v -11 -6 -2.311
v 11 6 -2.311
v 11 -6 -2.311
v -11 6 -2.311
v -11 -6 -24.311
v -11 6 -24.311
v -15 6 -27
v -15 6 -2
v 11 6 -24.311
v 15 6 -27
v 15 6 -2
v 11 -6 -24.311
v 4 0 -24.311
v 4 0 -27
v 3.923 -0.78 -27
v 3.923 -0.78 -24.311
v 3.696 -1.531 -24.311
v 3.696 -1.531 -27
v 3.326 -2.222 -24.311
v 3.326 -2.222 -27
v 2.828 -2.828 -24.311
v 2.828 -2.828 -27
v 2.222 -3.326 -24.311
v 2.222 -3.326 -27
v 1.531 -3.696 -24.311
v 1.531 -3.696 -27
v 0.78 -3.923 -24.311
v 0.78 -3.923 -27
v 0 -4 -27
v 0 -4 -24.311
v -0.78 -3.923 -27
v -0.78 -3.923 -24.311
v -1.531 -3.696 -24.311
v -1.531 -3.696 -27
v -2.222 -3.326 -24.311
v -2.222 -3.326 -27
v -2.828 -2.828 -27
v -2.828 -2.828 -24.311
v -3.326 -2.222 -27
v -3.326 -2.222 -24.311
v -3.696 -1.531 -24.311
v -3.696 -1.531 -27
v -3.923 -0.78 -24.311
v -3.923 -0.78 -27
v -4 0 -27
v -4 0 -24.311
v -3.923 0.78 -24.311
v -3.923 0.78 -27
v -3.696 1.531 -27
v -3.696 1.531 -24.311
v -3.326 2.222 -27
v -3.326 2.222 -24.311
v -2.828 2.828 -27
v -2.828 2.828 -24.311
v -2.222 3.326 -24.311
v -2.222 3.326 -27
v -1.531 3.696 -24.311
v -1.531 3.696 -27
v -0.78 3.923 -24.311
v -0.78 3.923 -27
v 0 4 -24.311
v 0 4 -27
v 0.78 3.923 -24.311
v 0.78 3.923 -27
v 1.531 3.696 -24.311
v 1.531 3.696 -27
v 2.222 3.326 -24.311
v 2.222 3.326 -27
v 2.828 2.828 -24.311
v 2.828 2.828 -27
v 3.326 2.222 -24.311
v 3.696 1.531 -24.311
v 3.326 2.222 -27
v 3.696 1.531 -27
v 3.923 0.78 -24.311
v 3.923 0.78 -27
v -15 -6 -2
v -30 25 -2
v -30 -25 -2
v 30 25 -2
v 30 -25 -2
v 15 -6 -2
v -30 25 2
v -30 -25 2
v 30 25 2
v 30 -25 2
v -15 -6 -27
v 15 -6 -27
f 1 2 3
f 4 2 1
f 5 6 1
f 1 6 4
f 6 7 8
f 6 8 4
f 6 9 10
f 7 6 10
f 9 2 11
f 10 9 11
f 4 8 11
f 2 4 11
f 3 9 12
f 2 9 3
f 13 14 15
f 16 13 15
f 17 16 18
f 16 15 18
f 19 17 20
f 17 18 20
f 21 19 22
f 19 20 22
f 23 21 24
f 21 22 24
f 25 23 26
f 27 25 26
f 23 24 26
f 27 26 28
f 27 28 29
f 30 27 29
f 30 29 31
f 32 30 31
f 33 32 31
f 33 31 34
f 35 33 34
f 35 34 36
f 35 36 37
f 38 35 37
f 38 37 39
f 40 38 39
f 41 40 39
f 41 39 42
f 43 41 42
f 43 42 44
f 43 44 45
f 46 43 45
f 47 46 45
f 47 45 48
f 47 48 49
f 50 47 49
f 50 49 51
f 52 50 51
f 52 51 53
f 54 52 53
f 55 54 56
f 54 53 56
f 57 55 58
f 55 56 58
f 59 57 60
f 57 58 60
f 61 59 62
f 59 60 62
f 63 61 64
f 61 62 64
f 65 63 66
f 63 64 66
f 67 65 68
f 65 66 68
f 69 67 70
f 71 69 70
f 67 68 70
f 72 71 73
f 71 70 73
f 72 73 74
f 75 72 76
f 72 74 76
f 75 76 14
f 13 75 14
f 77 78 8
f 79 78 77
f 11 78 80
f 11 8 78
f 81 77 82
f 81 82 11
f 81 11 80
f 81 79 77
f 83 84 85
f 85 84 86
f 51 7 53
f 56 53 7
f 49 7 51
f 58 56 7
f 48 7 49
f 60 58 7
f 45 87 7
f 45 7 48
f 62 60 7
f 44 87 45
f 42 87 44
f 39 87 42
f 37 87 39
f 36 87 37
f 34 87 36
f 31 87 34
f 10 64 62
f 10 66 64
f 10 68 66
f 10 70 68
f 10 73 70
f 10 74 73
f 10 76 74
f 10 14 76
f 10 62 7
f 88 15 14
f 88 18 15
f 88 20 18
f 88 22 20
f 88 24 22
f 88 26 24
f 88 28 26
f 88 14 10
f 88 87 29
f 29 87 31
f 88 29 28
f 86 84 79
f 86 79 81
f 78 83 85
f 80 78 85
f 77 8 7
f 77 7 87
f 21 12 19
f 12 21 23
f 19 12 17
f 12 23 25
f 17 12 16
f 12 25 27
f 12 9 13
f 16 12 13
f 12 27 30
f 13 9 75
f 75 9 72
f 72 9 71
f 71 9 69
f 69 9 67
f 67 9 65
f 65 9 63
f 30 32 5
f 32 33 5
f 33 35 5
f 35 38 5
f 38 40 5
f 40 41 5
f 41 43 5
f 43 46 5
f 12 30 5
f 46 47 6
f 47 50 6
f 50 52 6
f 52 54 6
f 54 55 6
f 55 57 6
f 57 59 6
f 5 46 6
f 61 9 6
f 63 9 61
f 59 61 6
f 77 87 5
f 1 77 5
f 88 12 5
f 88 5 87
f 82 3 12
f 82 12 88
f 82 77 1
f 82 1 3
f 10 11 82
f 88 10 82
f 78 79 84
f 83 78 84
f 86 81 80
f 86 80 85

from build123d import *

# Parameters (mm, degrees)
F0_W          = 60
F0_H          = 4
F1_DEPTH      = 25
F1_DEPTH_BACK = 25
F2_W          = 30
F2_H          = 12
F3_DEPTH      = 25
F4_W          = 22
F4_H          = 22
F5_DEPTH      = 25
F6_R          = 4
F7_DEPTH      = 10


with BuildPart() as f1:
    # F0 (on Front) → F1 (new body, two sides)
    with BuildSketch(Plane.XZ) as f1_sk:
        Rectangle(F0_W, F0_H)
    extrude(amount=F1_DEPTH)
    extrude(f1_sk.sketch, amount=-F1_DEPTH_BACK)

    # F2 (on face) → F3 (join)
    with BuildSketch(Plane(origin=(0, 0, -2), x_dir=(1, 0, 0), z_dir=(0, 0, -1))):
        Rectangle(F2_W, F2_H)
    extrude(amount=F3_DEPTH)

    # F4 (on face) → F5 (cut)
    with BuildSketch(Plane(origin=(0, 6, 0), x_dir=(-1, 0, 0), z_dir=(0, 1, 0))):
        with Locations((0, -13.310707)):
            Rectangle(F4_W, F4_H)
    extrude(amount=-F5_DEPTH, mode=Mode.SUBTRACT)

    # F6 (on face) → F7 (cut)
    with BuildSketch(Plane(origin=(0, 0, -27), x_dir=(1, 0, 0), z_dir=(0, 0, -1))):
        Circle(F6_R)
    extrude(amount=-F7_DEPTH, mode=Mode.SUBTRACT)


solid = f1.part
